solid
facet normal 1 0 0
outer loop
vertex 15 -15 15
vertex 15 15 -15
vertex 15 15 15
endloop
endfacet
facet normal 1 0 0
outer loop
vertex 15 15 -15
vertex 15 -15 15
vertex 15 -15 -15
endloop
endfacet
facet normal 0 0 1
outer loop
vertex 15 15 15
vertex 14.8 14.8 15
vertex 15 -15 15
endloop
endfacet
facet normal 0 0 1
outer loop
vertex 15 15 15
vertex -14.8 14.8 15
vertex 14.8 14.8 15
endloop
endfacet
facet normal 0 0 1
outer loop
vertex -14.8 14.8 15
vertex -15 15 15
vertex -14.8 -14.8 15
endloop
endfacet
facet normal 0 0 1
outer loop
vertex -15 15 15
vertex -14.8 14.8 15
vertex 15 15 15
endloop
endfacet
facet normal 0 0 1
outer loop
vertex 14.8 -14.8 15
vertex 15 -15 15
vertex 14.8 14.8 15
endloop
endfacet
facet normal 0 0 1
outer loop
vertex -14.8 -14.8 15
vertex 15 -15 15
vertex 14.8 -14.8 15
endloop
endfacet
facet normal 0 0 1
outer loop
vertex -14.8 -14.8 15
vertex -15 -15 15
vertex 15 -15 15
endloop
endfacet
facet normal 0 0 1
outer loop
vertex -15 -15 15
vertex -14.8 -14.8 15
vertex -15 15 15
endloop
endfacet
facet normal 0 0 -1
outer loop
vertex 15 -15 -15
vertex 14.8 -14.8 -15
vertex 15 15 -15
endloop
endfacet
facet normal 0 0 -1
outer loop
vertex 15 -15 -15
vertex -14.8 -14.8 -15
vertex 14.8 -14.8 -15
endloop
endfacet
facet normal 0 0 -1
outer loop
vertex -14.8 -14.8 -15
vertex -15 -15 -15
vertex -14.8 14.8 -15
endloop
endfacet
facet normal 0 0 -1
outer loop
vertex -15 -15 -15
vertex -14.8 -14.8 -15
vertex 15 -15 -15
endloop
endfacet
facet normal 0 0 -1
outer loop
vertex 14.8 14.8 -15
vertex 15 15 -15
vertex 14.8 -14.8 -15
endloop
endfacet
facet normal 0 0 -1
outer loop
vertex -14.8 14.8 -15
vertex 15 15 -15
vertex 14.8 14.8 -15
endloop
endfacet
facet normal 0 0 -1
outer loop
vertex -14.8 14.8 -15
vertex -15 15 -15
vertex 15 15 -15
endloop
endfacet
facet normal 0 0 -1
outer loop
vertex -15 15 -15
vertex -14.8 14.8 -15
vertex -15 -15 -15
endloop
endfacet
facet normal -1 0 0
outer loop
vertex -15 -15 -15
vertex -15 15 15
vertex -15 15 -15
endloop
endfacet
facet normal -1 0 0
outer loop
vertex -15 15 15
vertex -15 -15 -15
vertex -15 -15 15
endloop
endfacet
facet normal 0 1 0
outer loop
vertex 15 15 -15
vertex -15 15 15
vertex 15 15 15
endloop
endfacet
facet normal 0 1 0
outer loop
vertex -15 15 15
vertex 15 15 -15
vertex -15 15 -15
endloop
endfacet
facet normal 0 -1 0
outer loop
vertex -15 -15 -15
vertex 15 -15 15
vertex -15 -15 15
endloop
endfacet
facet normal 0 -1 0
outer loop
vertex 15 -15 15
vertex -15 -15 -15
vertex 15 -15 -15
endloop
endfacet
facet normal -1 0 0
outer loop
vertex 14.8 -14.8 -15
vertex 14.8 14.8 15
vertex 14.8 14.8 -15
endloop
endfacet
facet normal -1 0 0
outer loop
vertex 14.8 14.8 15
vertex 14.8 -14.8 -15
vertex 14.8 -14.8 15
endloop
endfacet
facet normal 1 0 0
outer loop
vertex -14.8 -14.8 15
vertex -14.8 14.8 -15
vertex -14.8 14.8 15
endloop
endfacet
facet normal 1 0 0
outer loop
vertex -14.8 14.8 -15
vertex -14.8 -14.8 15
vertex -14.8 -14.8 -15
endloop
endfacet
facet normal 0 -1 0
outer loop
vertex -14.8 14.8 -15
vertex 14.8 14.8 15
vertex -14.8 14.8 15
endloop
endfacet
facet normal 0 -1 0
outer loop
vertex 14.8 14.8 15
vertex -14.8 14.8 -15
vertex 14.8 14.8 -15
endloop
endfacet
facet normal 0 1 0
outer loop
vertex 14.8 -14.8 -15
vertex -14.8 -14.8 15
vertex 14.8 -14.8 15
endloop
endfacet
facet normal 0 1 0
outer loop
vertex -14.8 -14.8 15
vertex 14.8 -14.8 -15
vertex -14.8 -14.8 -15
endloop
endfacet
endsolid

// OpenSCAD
////// VARIAVEIS ///////////////

$fa = 1.5;
$fs = 0.5;


larCuboExt = 30;
proCuboExt = 30;
altCuboExt = 30;
paradeCuboExt = 0.40;

//////// MODULOS ////////////////

//Cubo externo
module CunoExterno(){
   difference(){
    color ("white"){
        paradeCuboExt = paradeCuboExt * 2;
        cube([larCuboExt,proCuboExt,altCuboExt], center=true);
    }
    #cube([(larCuboExt - paradeCuboExt), (proCuboExt - paradeCuboExt),(altCuboExt * 1.1) ], center=true); 
   }
}


////////// REDERIZACAO ////////////

CunoExterno();
